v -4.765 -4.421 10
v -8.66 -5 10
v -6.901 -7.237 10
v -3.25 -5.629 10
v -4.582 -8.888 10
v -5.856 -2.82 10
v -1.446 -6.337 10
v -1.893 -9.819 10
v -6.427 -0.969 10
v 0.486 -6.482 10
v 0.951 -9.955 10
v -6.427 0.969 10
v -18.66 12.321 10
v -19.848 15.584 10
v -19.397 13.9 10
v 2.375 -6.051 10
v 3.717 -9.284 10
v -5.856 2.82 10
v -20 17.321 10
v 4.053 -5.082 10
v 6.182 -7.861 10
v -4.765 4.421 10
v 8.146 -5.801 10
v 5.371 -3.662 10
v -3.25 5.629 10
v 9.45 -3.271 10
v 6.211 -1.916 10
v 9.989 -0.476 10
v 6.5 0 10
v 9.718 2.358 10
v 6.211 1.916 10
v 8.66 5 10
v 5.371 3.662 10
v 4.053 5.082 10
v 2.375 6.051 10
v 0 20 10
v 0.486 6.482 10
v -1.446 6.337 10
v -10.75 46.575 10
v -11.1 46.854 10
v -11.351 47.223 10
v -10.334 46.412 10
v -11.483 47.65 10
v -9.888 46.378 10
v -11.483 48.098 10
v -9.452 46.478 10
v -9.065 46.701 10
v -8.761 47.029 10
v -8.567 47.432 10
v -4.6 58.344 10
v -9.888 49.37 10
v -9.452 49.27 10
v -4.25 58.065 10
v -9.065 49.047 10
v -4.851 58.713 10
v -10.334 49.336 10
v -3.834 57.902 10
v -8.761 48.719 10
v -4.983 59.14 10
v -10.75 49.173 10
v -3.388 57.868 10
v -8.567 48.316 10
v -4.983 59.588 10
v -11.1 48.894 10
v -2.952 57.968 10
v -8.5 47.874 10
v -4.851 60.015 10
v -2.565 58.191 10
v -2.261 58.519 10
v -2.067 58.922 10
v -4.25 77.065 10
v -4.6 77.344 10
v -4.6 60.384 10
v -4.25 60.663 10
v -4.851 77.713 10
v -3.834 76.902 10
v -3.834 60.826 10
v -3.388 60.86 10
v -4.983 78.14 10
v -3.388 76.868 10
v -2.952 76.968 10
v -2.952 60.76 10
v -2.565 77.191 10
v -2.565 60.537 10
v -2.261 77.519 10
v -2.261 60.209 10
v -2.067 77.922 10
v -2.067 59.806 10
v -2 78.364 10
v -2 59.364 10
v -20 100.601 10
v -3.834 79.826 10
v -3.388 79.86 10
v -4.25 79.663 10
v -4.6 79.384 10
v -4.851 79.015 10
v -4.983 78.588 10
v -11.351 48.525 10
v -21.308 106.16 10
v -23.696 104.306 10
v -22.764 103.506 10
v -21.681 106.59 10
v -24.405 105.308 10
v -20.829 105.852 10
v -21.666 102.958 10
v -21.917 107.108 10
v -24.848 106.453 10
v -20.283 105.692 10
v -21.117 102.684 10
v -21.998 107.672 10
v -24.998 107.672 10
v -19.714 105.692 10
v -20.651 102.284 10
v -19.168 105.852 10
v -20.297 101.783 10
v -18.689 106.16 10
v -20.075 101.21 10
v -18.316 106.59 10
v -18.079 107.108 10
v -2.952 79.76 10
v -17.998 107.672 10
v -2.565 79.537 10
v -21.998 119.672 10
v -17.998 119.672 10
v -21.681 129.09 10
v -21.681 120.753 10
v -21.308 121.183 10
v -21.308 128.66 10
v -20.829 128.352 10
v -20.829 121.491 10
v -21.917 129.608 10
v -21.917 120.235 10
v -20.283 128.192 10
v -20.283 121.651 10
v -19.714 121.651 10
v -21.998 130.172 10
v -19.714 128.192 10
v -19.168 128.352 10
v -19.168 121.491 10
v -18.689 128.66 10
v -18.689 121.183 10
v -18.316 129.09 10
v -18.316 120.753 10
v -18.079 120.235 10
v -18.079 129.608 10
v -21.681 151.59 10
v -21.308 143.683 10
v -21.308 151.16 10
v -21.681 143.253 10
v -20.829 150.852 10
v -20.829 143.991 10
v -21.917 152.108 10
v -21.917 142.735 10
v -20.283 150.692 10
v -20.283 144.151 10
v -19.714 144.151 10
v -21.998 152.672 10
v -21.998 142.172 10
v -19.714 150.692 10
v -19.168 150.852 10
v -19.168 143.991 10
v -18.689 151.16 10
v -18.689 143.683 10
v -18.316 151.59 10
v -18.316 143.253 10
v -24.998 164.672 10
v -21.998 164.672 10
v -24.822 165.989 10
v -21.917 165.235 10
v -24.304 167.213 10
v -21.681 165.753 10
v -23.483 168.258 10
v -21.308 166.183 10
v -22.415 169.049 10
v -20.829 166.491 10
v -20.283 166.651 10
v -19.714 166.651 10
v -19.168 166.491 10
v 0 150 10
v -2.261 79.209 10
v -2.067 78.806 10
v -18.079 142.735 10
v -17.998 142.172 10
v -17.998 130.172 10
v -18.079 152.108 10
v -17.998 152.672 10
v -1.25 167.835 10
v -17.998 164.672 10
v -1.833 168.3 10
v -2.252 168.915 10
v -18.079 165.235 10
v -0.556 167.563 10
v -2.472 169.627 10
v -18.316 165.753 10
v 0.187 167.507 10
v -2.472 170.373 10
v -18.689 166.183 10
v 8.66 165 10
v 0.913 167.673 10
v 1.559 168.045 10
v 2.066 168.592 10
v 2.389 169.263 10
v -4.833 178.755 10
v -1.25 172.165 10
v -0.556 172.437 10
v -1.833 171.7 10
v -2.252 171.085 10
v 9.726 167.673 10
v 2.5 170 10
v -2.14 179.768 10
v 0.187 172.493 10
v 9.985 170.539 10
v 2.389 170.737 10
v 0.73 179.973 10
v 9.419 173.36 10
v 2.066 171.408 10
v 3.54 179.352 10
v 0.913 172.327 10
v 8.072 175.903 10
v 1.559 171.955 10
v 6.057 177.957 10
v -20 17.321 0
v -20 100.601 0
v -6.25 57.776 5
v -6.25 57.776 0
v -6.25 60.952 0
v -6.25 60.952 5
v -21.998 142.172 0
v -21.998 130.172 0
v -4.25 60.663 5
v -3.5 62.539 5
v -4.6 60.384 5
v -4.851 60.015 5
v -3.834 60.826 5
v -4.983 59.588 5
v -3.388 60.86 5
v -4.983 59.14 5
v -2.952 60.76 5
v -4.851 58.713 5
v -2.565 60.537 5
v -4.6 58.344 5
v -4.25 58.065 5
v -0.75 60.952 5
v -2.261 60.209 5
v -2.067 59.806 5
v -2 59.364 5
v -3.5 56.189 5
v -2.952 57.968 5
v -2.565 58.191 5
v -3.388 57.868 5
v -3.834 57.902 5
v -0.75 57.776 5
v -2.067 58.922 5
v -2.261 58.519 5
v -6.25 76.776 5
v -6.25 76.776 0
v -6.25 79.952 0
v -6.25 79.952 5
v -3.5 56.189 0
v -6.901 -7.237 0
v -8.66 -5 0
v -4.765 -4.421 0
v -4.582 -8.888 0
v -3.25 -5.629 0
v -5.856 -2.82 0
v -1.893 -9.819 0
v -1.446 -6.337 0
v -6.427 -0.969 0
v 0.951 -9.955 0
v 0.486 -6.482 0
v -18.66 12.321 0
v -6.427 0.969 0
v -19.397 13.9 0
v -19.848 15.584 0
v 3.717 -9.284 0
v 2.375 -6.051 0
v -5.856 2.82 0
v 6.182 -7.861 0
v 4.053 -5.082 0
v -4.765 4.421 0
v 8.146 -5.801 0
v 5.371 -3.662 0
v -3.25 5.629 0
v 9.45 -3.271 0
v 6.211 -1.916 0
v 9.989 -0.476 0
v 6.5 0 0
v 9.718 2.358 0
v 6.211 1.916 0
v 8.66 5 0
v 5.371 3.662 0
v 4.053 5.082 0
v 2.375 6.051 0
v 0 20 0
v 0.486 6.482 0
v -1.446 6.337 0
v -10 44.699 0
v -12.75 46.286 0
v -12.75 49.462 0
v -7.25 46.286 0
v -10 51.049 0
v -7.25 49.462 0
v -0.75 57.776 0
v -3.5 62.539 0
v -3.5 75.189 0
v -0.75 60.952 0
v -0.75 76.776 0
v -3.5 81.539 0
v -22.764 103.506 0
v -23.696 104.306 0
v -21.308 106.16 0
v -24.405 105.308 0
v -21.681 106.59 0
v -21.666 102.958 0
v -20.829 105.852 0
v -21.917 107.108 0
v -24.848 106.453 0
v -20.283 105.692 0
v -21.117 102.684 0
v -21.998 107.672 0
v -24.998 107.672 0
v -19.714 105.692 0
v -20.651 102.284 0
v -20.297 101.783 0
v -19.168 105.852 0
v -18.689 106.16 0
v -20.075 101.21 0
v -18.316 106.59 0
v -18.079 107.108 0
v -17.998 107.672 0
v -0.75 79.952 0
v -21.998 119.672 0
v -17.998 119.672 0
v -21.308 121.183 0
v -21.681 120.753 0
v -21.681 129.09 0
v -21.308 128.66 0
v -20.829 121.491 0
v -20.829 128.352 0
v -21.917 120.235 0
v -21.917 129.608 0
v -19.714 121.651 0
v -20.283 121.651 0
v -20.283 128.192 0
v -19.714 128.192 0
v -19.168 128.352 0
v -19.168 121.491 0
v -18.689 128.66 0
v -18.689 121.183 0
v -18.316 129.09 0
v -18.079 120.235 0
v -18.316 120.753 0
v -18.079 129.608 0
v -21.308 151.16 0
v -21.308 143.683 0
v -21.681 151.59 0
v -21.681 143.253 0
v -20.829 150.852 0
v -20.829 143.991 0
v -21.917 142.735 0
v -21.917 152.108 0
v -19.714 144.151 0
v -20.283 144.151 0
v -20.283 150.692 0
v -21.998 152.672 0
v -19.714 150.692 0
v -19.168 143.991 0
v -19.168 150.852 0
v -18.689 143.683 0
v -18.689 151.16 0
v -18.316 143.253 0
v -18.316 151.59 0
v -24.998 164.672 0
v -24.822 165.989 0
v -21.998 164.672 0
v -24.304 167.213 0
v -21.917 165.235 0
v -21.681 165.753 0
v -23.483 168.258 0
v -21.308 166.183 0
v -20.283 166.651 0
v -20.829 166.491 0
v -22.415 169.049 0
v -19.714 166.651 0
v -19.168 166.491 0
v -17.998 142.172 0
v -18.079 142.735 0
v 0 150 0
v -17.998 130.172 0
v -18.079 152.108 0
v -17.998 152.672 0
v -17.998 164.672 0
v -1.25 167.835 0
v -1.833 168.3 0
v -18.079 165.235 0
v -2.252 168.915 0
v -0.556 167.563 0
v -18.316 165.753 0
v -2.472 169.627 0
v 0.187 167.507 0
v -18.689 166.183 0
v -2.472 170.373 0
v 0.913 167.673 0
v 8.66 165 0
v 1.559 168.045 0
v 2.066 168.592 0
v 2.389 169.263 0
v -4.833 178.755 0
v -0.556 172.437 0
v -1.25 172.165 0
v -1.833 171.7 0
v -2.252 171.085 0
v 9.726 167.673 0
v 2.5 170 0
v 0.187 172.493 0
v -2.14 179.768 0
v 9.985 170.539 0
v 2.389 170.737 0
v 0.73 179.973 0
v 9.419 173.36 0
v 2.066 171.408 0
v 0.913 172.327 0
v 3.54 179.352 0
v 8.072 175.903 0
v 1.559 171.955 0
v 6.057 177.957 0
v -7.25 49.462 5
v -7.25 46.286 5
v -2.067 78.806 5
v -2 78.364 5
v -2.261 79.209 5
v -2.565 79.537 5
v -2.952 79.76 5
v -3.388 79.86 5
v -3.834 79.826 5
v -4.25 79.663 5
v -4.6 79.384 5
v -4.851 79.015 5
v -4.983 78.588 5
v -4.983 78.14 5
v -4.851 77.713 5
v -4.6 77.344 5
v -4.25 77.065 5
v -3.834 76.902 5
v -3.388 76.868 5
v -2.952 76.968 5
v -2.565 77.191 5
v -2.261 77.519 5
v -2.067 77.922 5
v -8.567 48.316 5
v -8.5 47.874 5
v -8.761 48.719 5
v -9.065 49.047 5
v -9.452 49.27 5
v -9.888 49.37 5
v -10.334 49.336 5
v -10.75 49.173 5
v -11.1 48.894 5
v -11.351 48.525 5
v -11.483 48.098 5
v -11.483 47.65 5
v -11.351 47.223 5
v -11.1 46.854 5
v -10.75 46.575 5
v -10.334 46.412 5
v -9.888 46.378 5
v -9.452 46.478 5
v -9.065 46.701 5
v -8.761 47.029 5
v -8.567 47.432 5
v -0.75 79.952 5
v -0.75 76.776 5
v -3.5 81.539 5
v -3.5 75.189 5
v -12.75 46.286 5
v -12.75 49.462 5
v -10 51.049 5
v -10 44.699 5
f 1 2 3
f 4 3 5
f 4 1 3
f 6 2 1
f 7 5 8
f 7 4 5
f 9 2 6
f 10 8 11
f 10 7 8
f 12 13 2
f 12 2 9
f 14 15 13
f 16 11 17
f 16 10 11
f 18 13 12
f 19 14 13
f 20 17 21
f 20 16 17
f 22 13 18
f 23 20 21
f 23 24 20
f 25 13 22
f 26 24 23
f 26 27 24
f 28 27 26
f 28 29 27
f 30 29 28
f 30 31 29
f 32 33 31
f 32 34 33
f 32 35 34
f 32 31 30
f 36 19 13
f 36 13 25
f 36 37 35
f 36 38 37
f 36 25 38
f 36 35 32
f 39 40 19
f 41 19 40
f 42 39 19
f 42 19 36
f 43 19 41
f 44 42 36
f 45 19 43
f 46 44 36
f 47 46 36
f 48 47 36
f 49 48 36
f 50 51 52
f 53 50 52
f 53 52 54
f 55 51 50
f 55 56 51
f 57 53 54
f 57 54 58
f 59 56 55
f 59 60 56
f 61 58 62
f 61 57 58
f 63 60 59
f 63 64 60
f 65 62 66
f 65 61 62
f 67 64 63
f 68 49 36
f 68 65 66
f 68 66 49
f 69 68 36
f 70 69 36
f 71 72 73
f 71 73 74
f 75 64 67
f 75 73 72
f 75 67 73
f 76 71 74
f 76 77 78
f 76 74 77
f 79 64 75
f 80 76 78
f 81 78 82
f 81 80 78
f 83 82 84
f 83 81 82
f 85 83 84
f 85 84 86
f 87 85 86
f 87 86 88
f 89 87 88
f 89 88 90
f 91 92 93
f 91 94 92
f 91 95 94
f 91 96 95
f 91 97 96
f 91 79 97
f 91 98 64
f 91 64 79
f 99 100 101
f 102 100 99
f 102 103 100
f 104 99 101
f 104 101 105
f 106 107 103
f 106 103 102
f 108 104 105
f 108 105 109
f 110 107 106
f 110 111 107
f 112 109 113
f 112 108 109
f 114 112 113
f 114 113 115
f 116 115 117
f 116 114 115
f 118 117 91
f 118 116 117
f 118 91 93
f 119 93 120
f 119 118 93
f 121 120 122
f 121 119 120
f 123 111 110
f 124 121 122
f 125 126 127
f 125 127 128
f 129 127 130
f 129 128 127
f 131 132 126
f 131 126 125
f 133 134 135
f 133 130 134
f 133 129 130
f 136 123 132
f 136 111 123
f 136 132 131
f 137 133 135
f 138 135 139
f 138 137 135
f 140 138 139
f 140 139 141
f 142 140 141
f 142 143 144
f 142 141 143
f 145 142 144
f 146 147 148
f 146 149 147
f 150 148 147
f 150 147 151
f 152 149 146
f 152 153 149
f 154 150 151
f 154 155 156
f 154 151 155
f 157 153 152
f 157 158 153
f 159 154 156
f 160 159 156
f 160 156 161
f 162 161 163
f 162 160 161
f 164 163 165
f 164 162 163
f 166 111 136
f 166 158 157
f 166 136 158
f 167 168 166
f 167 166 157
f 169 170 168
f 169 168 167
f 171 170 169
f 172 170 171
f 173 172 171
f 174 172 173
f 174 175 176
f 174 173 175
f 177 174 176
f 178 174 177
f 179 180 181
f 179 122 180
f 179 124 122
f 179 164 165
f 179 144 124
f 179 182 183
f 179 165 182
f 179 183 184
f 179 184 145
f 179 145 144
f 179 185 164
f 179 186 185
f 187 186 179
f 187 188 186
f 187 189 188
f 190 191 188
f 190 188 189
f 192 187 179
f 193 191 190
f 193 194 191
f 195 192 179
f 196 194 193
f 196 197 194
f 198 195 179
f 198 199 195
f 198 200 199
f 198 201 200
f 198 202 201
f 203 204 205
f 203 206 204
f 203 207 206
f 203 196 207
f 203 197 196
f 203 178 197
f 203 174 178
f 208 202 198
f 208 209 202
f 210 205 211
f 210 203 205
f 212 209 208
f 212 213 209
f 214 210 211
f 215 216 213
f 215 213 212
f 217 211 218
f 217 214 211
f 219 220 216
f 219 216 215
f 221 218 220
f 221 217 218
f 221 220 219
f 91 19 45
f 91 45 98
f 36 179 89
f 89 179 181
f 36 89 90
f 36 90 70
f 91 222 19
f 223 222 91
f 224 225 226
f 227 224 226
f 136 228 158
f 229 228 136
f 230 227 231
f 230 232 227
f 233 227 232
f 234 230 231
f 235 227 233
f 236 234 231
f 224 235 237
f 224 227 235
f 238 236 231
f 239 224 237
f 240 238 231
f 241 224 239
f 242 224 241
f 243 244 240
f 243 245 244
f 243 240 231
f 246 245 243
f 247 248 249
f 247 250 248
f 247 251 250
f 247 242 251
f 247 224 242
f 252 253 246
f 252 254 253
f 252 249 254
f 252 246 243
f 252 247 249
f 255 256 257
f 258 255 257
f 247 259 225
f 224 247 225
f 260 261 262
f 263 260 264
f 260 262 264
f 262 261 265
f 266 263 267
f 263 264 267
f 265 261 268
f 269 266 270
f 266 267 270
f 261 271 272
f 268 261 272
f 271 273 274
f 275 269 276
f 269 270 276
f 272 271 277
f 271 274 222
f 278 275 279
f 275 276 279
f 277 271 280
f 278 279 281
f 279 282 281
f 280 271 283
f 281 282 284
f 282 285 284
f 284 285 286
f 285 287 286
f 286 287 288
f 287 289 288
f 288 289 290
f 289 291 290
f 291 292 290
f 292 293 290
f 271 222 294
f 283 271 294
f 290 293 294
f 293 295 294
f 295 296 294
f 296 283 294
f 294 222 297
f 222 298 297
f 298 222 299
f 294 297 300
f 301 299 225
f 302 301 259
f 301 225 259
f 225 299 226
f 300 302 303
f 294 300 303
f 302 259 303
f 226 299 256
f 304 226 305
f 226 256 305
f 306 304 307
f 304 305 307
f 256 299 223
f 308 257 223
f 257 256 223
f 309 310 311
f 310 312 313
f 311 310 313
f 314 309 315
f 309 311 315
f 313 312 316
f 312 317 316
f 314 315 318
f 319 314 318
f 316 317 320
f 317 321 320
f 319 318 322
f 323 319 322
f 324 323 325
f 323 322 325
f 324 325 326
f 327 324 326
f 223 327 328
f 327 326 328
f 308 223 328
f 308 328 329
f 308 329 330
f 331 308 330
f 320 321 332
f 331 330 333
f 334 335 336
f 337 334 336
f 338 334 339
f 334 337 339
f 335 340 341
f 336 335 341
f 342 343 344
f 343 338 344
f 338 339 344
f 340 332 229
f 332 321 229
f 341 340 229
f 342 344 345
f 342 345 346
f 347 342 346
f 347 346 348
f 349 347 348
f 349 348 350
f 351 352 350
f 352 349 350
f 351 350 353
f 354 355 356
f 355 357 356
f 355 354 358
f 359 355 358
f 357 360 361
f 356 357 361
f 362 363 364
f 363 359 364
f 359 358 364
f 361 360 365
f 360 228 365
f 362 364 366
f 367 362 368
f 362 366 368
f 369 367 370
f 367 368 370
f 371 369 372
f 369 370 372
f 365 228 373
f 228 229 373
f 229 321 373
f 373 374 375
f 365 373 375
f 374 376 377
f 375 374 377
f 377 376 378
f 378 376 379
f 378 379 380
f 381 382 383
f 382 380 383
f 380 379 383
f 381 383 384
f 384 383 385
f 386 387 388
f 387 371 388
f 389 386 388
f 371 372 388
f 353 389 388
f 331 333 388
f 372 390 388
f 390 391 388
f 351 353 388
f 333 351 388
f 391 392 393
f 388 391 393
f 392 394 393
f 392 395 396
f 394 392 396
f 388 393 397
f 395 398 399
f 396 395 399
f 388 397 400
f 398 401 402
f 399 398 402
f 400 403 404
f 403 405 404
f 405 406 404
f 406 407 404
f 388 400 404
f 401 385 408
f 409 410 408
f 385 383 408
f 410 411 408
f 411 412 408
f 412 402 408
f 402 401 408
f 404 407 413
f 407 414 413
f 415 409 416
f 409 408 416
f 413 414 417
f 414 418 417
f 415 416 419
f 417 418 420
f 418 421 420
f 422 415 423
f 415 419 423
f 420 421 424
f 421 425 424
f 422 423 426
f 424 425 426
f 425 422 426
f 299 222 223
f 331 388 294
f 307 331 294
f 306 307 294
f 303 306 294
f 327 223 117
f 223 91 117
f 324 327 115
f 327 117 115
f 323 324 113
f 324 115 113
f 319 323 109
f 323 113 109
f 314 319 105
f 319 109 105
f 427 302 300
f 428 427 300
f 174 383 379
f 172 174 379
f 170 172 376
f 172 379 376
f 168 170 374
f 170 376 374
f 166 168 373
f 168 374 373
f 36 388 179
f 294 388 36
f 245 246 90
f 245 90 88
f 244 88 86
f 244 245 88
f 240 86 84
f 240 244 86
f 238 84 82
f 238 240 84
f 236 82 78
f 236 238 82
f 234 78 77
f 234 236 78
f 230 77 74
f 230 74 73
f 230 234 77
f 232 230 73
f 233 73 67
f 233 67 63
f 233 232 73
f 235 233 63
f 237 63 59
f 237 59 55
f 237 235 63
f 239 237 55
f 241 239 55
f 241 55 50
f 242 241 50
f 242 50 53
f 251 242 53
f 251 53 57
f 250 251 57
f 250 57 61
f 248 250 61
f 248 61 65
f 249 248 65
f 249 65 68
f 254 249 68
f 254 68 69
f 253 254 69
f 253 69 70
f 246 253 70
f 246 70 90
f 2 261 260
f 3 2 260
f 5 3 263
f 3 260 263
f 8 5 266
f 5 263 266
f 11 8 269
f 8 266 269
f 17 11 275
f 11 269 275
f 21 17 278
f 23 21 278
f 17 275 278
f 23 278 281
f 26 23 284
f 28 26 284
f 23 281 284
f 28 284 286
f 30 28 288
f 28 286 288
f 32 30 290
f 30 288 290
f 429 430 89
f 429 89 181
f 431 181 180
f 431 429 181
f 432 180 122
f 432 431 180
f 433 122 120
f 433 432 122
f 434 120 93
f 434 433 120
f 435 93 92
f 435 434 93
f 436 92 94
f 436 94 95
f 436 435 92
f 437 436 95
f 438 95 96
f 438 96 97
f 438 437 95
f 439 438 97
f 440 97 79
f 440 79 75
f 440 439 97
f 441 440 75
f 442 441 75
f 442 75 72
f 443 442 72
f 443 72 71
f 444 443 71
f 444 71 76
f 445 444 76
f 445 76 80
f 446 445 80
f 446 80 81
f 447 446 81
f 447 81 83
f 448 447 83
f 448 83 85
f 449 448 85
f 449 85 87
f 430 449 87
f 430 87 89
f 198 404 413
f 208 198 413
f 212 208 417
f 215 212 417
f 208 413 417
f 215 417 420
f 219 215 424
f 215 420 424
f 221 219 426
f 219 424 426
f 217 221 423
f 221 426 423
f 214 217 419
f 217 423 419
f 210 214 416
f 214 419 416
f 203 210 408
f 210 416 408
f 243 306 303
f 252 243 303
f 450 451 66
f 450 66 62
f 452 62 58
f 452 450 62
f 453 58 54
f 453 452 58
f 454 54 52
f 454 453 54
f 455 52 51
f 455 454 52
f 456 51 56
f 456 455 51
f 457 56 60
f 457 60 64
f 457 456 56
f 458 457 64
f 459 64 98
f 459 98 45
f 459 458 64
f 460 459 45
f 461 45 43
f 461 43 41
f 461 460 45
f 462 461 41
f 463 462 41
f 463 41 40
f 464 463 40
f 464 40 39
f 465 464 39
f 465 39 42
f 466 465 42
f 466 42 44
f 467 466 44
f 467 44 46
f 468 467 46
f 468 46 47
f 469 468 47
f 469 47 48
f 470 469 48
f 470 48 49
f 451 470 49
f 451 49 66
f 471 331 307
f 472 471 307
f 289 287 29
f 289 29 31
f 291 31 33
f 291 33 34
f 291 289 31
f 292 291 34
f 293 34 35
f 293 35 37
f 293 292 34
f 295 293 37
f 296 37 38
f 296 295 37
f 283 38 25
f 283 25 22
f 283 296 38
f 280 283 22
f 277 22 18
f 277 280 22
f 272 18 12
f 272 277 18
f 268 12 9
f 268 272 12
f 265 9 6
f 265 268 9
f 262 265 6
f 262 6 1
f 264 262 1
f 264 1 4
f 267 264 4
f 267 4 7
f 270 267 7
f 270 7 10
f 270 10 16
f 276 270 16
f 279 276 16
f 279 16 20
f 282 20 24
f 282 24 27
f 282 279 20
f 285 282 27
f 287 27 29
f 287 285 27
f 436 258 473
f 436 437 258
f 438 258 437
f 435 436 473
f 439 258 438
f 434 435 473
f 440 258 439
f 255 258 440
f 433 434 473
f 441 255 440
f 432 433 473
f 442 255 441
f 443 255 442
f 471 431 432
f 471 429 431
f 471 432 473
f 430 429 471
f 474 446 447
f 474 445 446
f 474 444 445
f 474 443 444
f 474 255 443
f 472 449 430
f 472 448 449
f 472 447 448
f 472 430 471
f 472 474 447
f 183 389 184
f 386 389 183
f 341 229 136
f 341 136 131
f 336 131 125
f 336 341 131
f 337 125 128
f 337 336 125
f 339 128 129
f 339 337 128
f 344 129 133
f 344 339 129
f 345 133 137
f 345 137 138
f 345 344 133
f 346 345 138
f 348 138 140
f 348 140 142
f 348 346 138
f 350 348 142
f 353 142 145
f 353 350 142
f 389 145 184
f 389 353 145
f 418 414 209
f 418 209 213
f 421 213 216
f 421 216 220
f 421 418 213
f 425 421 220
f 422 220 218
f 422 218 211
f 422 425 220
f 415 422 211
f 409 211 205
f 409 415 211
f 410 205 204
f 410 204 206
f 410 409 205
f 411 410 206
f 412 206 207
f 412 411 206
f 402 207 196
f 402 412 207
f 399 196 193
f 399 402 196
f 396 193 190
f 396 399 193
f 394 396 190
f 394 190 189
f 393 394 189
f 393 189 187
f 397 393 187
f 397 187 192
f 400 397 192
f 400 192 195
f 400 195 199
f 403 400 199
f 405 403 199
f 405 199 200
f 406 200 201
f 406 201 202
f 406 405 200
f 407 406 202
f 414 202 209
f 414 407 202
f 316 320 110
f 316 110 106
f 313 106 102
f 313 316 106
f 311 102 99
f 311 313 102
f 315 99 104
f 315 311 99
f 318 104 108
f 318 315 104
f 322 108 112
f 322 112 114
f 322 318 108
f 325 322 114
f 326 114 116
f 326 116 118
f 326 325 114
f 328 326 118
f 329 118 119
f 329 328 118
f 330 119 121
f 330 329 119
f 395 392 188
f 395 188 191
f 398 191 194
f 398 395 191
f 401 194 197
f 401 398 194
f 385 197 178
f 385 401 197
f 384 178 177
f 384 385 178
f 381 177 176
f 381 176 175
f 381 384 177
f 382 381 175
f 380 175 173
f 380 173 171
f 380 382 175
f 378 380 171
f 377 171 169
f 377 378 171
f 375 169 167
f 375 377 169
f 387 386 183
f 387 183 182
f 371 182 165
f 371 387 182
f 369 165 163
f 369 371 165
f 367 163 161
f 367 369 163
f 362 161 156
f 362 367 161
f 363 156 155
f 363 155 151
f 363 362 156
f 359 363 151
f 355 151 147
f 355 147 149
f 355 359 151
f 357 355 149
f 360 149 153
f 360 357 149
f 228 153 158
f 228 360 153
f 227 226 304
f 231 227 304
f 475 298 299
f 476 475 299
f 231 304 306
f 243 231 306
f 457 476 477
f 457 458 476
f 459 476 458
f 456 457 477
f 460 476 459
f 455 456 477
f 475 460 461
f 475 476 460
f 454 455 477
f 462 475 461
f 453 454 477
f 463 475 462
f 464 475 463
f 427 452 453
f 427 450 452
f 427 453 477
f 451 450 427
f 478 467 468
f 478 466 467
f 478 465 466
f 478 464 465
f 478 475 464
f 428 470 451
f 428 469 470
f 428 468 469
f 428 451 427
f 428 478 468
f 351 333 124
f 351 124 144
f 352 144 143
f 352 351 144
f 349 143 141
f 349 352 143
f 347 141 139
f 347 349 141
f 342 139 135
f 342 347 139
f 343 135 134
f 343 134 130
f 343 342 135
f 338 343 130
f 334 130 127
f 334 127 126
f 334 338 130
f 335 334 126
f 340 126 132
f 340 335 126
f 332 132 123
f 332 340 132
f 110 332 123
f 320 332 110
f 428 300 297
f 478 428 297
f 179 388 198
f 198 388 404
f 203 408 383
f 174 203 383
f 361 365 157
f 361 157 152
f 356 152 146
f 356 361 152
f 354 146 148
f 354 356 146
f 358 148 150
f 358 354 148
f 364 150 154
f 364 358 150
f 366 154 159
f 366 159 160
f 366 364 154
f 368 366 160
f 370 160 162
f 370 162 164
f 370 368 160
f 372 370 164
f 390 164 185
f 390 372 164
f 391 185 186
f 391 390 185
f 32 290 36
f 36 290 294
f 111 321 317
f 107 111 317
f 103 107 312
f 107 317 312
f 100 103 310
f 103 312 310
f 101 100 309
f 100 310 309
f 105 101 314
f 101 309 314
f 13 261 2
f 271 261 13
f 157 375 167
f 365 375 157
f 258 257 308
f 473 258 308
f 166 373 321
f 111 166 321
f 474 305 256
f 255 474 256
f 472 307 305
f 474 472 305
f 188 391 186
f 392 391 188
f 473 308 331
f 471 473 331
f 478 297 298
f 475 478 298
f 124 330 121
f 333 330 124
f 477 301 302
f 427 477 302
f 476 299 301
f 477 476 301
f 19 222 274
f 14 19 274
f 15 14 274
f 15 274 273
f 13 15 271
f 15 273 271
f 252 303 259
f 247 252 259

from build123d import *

# Parameters (mm, degrees)
SKETCH_R     = 6.5
SKETCH_R_2   = 2.5
SKETCH_R_3   = 1.5
PAD_DEPTH    = 10
FILLET_R     = 2.5
POCKET_DEPTH = 5


with BuildPart() as part:
    # Sketch → Pad (new body)
    with BuildSketch(Plane.XY):
        with BuildLine():
            ThreePointArc((-8.660254, -5), (5, -8.660254), (8.660254, 5))
            Line((8.660254, 5), (0, 20))
            Line((0, 150), (0, 20))
            Line((0, 150), (8.660254, 165))
            ThreePointArc((8.660254, 165), (7.138618, 177.002866), (-4.832824, 178.754645))
            Line((-4.832824, 178.754645), (-22.414778, 169.048885))
            ThreePointArc((-22.414778, 169.048885), (-24.304296, 167.213013), (-24.998366, 164.671563))
            Line((-24.998366, 164.671563), (-24.998366, 107.671563))
            ThreePointArc((-24.998366, 107.671563), (-23.534478, 104.136606), (-20, 102.671563))
            Line((-20, 17.320508), (-20, 102.671563))
            ThreePointArc((-20, 17.320508), (-19.659258, 14.732318), (-18.660254, 12.320508))
            Line((-8.660254, -5), (-18.660254, 12.320508))
        make_face()
        Circle(SKETCH_R, mode=Mode.SUBTRACT)
        with Locations((0, 170)):
            Circle(SKETCH_R_2, mode=Mode.SUBTRACT)
        with Locations((-3.5, 78.364)):
            Circle(SKETCH_R_3, mode=Mode.SUBTRACT)
        with Locations((-3.5, 59.364)):
            Circle(SKETCH_R_3, mode=Mode.SUBTRACT)
        with Locations((-10, 47.874)):
            Circle(SKETCH_R_3, mode=Mode.SUBTRACT)
        with BuildLine():
            ThreePointArc((-21.998366, 107.671563), (-19.998366, 105.671563), (-17.998366, 107.671563))
            Line((-17.998366, 107.671563), (-17.998366, 119.671563))
            ThreePointArc((-17.998366, 119.671563), (-19.998366, 121.671563), (-21.998366, 119.671563))
            Line((-21.998366, 119.671563), (-21.998366, 107.671563))
        make_face(mode=Mode.SUBTRACT)
        with BuildLine():
            ThreePointArc((-17.998366, 164.671563), (-19.998366, 166.671563), (-21.998366, 164.671563))
            Line((-21.998366, 164.671563), (-21.998366, 152.671563))
            ThreePointArc((-21.998366, 152.671563), (-19.998366, 150.671563), (-17.998366, 152.671563))
            Line((-17.998366, 152.671563), (-17.998366, 164.671563))
        make_face(mode=Mode.SUBTRACT)
        with BuildLine():
            ThreePointArc((-17.998366, 142.171563), (-19.998366, 144.171563), (-21.998366, 142.171563))
            Line((-21.998366, 142.171563), (-21.998366, 130.171563))
            ThreePointArc((-21.998366, 130.171563), (-19.998366, 128.171563), (-17.998366, 130.171563))
            Line((-17.998366, 130.171563), (-17.998366, 142.171563))
        make_face(mode=Mode.SUBTRACT)
    extrude(amount=PAD_DEPTH)

    # Fillet
    fillet_edges = [part.edges().sort_by_distance(p)[0] for p in [
        (-20, 102.671563, 5),
    ]]
    fillet(fillet_edges, radius=FILLET_R)

    # Sketch001 (on Face2 of Fillet) → Pocket (cut)
    with BuildSketch(Plane(origin=(0, 0, 0), x_dir=(1, 0, 0), z_dir=(0, 0, -1))):
        Polygon((-3.5, -81.539426), (-0.75, -79.951713), (-0.75, -76.776287), (-3.5, -75.188574), (-6.25, -76.776287), (-6.25, -79.951713), align=None)
        Polygon((-3.5, -62.539426), (-0.75, -60.951713), (-0.75, -57.776287), (-3.5, -56.188574), (-6.25, -57.776287), (-6.25, -60.951713), align=None)
        Polygon((-10, -51.049426), (-7.25, -49.461713), (-7.25, -46.286287), (-10, -44.698574), (-12.75, -46.286287), (-12.75, -49.461713), align=None)
    extrude(amount=-POCKET_DEPTH, mode=Mode.SUBTRACT)


solid = part.part
